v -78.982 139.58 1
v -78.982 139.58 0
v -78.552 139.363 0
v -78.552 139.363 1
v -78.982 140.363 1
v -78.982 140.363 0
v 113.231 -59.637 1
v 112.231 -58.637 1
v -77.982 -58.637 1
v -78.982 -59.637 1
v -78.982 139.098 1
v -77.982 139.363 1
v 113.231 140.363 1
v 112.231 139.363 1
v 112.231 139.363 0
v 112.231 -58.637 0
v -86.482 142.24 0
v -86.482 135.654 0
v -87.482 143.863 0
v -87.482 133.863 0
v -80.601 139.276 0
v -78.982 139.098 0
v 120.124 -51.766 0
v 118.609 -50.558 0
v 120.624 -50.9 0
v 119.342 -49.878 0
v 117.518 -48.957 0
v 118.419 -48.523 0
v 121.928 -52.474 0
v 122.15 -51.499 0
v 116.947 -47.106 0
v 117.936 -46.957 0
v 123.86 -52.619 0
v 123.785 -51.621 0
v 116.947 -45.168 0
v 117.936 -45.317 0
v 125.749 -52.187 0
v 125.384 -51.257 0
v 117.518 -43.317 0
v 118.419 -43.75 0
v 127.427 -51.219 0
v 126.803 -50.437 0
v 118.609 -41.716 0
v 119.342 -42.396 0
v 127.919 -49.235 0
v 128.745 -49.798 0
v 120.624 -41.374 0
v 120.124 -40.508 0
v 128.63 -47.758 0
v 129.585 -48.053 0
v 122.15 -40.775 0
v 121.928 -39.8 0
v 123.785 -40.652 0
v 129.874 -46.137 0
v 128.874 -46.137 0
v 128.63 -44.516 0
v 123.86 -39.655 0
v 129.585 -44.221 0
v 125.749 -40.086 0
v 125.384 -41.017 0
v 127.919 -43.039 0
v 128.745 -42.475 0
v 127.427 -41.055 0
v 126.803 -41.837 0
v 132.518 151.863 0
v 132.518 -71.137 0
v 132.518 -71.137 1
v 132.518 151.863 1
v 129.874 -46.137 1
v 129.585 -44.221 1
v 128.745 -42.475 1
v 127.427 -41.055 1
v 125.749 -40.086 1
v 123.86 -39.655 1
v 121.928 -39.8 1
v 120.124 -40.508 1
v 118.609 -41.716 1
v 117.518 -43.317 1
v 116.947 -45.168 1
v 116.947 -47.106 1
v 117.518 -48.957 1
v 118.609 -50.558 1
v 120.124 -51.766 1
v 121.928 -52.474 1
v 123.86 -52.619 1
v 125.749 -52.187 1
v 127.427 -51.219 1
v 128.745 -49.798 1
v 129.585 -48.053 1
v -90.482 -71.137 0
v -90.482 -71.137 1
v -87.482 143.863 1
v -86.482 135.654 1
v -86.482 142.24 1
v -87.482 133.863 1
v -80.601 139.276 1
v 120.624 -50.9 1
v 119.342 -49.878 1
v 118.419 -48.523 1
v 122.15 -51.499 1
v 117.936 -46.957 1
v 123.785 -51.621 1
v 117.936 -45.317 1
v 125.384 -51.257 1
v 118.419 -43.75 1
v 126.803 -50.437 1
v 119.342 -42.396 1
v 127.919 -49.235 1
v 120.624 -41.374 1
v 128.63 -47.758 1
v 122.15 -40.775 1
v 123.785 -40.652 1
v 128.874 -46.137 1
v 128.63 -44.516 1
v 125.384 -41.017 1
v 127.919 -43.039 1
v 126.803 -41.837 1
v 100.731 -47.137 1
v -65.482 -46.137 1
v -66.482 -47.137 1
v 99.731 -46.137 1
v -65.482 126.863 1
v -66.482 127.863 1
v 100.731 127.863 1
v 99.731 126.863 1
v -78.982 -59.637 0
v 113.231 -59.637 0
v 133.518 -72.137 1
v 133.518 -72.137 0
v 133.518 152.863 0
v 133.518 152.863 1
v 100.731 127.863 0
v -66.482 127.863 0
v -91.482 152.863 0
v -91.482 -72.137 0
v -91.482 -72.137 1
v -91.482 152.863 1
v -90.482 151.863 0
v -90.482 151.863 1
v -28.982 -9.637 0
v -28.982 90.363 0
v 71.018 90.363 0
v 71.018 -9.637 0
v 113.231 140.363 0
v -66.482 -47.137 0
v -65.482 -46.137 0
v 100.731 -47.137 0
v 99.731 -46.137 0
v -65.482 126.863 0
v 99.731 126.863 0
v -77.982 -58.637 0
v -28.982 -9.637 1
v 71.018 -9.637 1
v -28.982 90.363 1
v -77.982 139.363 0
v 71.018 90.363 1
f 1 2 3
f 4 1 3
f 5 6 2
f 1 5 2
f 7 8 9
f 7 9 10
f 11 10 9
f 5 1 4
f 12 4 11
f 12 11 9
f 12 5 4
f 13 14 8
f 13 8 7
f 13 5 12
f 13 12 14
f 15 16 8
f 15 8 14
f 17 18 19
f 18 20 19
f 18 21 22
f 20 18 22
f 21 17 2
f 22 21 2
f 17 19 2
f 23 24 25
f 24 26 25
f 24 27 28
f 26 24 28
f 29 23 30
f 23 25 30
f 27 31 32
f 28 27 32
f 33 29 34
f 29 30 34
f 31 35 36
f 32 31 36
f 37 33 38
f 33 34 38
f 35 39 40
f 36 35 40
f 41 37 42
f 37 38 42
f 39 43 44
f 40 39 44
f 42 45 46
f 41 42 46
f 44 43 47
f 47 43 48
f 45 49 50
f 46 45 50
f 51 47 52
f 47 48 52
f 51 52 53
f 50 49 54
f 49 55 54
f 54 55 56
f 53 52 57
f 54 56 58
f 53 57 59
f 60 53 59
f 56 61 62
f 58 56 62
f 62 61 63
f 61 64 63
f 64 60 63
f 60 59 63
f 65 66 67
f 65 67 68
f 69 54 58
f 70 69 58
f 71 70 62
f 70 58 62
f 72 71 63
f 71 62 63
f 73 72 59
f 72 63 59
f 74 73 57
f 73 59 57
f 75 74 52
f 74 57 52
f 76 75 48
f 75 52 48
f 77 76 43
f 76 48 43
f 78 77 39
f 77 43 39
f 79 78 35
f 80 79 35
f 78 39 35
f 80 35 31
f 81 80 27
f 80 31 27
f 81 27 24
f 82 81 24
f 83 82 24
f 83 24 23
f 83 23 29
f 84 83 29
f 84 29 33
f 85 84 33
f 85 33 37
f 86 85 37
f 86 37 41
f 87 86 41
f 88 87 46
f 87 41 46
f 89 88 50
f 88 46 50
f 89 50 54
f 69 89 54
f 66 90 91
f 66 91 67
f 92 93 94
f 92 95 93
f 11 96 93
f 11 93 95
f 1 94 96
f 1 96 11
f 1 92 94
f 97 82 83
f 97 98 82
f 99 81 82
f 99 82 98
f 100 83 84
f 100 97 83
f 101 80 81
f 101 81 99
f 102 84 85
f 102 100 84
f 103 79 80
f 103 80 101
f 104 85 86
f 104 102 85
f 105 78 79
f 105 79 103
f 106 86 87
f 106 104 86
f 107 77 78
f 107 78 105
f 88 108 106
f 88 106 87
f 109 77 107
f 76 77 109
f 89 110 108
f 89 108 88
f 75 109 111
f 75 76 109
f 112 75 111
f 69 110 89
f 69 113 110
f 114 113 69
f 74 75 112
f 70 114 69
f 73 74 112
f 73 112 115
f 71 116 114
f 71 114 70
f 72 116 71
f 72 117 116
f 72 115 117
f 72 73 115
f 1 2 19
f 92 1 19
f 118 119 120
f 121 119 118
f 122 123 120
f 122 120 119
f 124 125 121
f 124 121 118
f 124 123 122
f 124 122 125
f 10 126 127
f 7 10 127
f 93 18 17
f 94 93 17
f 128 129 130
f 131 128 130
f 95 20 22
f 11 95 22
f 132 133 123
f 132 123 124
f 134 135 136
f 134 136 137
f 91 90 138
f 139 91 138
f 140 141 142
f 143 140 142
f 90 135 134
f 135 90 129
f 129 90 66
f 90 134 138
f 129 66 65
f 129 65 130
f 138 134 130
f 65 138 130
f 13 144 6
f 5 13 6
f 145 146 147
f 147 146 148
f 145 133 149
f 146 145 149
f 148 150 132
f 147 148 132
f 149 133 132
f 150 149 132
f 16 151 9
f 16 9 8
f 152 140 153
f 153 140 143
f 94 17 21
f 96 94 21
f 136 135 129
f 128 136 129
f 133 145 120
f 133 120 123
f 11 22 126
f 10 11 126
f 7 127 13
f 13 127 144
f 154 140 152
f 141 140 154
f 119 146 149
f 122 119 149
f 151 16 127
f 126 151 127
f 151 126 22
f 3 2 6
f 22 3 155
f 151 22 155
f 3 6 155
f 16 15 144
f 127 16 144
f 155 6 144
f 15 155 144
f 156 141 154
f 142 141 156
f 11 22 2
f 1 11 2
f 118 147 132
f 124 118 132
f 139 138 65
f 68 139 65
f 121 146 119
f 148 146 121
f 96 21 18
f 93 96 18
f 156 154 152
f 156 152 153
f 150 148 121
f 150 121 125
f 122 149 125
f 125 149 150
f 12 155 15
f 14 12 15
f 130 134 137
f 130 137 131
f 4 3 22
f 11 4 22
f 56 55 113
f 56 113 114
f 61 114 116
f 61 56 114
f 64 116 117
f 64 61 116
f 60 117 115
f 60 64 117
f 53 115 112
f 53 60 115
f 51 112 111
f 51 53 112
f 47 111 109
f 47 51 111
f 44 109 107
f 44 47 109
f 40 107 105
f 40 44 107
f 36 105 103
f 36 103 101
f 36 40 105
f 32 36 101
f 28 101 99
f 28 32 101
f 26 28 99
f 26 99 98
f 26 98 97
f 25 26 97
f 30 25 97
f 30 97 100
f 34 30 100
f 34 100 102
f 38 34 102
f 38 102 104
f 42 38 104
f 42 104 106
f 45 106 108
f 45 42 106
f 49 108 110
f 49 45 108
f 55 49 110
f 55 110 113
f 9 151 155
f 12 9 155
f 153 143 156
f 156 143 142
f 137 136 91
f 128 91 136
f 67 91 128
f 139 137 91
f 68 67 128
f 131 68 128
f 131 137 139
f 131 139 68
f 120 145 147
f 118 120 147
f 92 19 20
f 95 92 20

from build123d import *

# Parameters (mm, degrees)
F1_W     = 225
F1_H     = 225
F1_W_2   = 223
F1_H_2   = 223
F2_DEPTH = 1
F1_W_3   = 190.2133469
F1_H_3   = 198
F1_W_4   = 167.2133469
F1_H_4   = 175
F1_W_5   = 165.2133469
F1_H_5   = 173
F1_R     = 6.5
F1_R_2   = 5.5
F1_W_6   = 100
F1_H_6   = 100


with BuildPart() as f2:
    # F1 (on Top) → F2 (new body)
    with BuildSketch(Plane.XY):
        with Locations((21.0175617039, 40.3632308638)):
            Rectangle(F1_W, F1_H)
        with Locations((21.0175617039, 40.3632308638)):
            Rectangle(F1_W_2, F1_H_2, mode=Mode.SUBTRACT)
    extrude(amount=F2_DEPTH)


with BuildPart() as f2b:
    # F1 (on Top) → F2, piece 2 (new body)
    with BuildSketch(Plane.XY):
        Polygon((113.2309086039, 140.3632308638), (-78.9824382961, 140.3632308638), (-78.9824382961, 139.580053155), (-78.5521527463, 139.3632308638), (-78.9824382961, 139.0982258413), (-78.9824382961, -59.6367691362), (113.2309086039, -59.6367691362), align=None)
        with Locations((17.1242351539, 40.3632308638)):
            Rectangle(F1_W_3, F1_H_3, mode=Mode.SUBTRACT)
    extrude(amount=F2_DEPTH)


with BuildPart() as f2c:
    # F1 (on Top) → F2, piece 3 (new body)
    with BuildSketch(Plane.XY):
        with Locations((17.1242351539, 40.3632308638)):
            Rectangle(F1_W_4, F1_H_4)
        with Locations((17.1242351539, 40.3632308638)):
            Rectangle(F1_W_5, F1_H_5, mode=Mode.SUBTRACT)
    extrude(amount=F2_DEPTH)


with BuildPart() as f2d:
    # F1 (on Top) → F2, piece 4 (new body)
    with BuildSketch(Plane.XY):
        with Locations((123.3742351539, -46.1367691362)):
            Circle(F1_R)
        with Locations((123.3742351539, -46.1367691362)):
            Circle(F1_R_2, mode=Mode.SUBTRACT)
    extrude(amount=F2_DEPTH)


with BuildPart() as f2e:
    # F1 (on Top) → F2, piece 5 (new body)
    with BuildSketch(Plane.XY):
        with Locations((21.0175617039, 40.3632308638)):
            Rectangle(F1_W_6, F1_H_6)
    extrude(amount=F2_DEPTH)


with BuildPart() as f2f:
    # F1 (on Top) → F2, piece 6 (new body)
    with BuildSketch(Plane.XY):
        Polygon((-78.9824382961, 139.0982258413), (-78.9824382961, 139.580053155), (-87.4824382961, 143.8632308638), (-87.4824382961, 133.8632308638), align=None)
        Polygon((-86.4824382961, 135.6535530649), (-86.4824382961, 142.2395425821), (-80.6009615945, 139.2758472994), align=None, mode=Mode.SUBTRACT)
    extrude(amount=F2_DEPTH)


solid = Compound([f2.part, f2b.part, f2c.part, f2d.part, f2e.part, f2f.part])
